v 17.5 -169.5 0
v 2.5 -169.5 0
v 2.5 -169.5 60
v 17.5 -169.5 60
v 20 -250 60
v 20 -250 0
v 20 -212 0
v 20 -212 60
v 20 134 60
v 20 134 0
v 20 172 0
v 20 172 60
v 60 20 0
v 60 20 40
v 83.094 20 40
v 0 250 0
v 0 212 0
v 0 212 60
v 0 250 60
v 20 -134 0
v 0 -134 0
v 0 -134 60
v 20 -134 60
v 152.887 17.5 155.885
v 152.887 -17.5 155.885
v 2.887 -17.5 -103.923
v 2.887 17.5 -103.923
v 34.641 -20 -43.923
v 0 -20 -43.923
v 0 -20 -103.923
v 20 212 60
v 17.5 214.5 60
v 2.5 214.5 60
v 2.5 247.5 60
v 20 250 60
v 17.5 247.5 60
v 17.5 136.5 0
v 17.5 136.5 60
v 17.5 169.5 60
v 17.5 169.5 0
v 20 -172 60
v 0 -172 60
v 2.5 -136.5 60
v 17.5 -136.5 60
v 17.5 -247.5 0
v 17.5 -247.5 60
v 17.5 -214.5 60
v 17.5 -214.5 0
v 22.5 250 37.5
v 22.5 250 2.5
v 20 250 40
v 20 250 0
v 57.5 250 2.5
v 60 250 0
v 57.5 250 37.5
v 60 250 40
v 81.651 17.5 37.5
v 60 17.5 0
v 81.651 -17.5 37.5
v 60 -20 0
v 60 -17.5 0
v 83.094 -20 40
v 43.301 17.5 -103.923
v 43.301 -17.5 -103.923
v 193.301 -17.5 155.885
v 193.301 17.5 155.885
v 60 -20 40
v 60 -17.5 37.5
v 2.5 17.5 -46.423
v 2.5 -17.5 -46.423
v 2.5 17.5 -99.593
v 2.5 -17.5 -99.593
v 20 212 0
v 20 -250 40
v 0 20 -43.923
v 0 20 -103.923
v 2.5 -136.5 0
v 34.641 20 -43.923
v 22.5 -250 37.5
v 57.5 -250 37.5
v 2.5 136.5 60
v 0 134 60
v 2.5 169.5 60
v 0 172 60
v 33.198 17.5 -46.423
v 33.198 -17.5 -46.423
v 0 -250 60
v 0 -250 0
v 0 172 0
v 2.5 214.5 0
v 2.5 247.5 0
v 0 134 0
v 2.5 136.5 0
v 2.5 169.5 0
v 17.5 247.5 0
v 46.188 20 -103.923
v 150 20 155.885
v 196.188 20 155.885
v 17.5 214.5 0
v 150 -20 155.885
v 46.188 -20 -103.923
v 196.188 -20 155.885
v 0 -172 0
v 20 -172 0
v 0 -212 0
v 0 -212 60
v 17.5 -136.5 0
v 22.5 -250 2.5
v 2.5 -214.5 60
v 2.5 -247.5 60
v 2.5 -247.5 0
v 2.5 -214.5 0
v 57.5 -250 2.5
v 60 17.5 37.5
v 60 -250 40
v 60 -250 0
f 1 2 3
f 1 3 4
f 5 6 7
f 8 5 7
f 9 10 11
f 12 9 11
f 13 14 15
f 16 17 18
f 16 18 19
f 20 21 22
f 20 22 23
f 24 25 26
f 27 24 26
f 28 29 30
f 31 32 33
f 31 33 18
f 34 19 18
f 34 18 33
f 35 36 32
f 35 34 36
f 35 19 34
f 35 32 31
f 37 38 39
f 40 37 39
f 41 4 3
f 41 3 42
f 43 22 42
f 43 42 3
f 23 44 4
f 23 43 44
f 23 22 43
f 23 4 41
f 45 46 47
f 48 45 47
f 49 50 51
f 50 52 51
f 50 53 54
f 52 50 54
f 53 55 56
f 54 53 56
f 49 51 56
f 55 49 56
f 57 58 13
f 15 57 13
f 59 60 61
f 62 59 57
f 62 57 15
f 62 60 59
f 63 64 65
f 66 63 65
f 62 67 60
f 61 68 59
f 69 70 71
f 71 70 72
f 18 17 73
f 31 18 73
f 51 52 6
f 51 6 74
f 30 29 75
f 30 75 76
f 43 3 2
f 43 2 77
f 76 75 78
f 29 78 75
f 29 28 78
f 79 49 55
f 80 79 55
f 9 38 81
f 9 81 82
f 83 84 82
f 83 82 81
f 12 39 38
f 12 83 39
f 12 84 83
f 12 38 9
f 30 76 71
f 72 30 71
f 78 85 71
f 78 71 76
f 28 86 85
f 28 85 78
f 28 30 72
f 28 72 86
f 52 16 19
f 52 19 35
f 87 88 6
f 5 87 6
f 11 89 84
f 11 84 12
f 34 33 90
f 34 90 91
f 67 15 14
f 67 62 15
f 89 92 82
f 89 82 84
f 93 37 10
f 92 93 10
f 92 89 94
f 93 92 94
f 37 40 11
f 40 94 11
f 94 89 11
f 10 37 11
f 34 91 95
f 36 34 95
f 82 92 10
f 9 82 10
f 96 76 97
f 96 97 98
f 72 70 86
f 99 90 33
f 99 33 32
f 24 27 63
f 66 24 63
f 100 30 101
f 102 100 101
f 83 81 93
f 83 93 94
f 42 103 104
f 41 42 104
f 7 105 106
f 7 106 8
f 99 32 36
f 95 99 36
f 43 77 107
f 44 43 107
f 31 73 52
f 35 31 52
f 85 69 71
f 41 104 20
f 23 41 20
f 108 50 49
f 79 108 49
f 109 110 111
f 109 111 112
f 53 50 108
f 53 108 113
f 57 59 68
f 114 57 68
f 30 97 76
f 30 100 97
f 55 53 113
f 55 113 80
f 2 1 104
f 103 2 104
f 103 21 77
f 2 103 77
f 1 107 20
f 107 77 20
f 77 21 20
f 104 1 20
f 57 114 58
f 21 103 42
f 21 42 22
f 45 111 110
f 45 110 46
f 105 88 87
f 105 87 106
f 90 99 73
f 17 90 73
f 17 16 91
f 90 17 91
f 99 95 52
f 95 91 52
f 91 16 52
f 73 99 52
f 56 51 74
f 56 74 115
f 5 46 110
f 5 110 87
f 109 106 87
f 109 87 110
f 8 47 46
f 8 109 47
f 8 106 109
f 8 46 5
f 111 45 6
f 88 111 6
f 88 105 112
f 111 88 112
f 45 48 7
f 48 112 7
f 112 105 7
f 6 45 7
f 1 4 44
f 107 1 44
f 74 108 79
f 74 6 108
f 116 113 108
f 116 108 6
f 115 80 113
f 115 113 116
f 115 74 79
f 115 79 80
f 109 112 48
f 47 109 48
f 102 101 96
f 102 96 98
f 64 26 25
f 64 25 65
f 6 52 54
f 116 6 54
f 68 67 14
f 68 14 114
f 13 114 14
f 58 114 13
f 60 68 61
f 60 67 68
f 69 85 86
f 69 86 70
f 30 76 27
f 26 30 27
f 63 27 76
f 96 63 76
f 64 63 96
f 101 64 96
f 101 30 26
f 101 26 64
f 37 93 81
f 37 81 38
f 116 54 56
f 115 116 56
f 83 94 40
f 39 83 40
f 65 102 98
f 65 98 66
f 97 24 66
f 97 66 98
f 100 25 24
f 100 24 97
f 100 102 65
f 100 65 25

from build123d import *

# Parameters (mm, degrees)
F0_W           = 20
F0_H           = 38
F1_DEPTH       = 60
F2_T           = -2.5
F2_2_T         = -2.5
F2_3_T         = -2.5
F2_4_T         = -2.5
F3_W           = 40
F3_H           = 40
F4_DEPTH       = 250
F4_DEPTH_BACK  = 250
F5_T           = -2.5
F7_DEPTH       = 20
F7_DEPTH_BACK  = 20
F8_T           = -2.5
F10_DEPTH      = 20
F10_DEPTH_BACK = 20
F11_T          = -2.5
F13_DEPTH      = 20
F13_DEPTH_BACK = 20
F14_T          = -2.5


with BuildPart() as f1:
    # F0 (on Top) → F1 (new body)
    with BuildSketch(Plane.XY):
        with Locations((10, 231)):
            Rectangle(F0_W, F0_H)
    extrude(amount=F1_DEPTH)

    # F2#4
    f2_4_openings = [f1.faces().sort_by_distance(p)[0] for p in [
        (10, 231, 60),
        (10, 231, 0),
    ]]
    offset(amount=F2_4_T, openings=f2_4_openings)


with BuildPart() as f1b:
    # F0 (on Top) → F1, piece 2 (new body)
    with BuildSketch(Plane.XY):
        with Locations((10, 153)):
            Rectangle(F0_W, F0_H)
    extrude(amount=F1_DEPTH)

    # F2#3
    f2_3_openings = [f1b.faces().sort_by_distance(p)[0] for p in [
        (10, 153, 60),
        (10, 153, 0),
    ]]
    offset(amount=F2_3_T, openings=f2_3_openings)


with BuildPart() as f1c:
    # F0 (on Top) → F1, piece 3 (new body)
    with BuildSketch(Plane.XY):
        with Locations((10, -231)):
            Rectangle(F0_W, F0_H)
    extrude(amount=F1_DEPTH)

    # F2
    f2_openings = [f1c.faces().sort_by_distance(p)[0] for p in [
        (10, -231, 60),
        (10, -231, 0),
    ]]
    offset(amount=F2_T, openings=f2_openings)


with BuildPart() as f1d:
    # F0 (on Top) → F1, piece 4 (new body)
    with BuildSketch(Plane.XY):
        with Locations((10, -153)):
            Rectangle(F0_W, F0_H)
    extrude(amount=F1_DEPTH)

    # F2#2
    f2_2_openings = [f1d.faces().sort_by_distance(p)[0] for p in [
        (10, -153, 60),
        (10, -153, 0),
    ]]
    offset(amount=F2_2_T, openings=f2_2_openings)


with BuildPart() as f4:
    # F3 (on Front) → F4 (new body, two sides)
    with BuildSketch(Plane.XZ) as f4_sk:
        with Locations((40, 20)):
            Rectangle(F3_W, F3_H)
    extrude(amount=F4_DEPTH)
    extrude(f4_sk.sketch, amount=-F4_DEPTH_BACK)

    # F5
    f5_openings = [f4.faces().sort_by_distance(p)[0] for p in [
        (40, -250, 20),
        (40, 250, 20),
    ]]
    offset(amount=F5_T, openings=f5_openings)


with BuildPart() as f7:
    # F6 (on Front) → F7 (new body, two sides)
    with BuildSketch(Plane.XZ) as f7_sk:
        Polygon((150, 155.8845726812), (0, -103.9230484541), (46.1880215352, -103.9230484541), (196.1880215352, 155.8845726812), align=None)
    extrude(amount=F7_DEPTH)
    extrude(f7_sk.sketch, amount=-F7_DEPTH_BACK)

    # F8
    f8_openings = [f7.faces().sort_by_distance(p)[0] for p in [
        (23.094011, 0, -103.923048),
        (173.094011, 0, 155.884573),
    ]]
    offset(amount=F8_T, openings=f8_openings)


with BuildPart() as f10:
    # F9 (on Front) → F10 (new body, two sides)
    with BuildSketch(Plane.XZ) as f10_sk:
        Polygon((34.6410161514, -43.9230484541), (0, -43.9230484541), (0, -103.9230484541), align=None)
    extrude(amount=F10_DEPTH)
    extrude(f10_sk.sketch, amount=-F10_DEPTH_BACK)

    # F11
    f11_openings = [f10.faces().sort_by_distance(p)[0] for p in [
        (17.320508, 0, -73.923048),
    ]]
    offset(amount=F11_T, openings=f11_openings)


with BuildPart() as f13:
    # F12 (on Front) → F13 (new body, two sides)
    with BuildSketch(Plane.XZ) as f13_sk:
        Polygon((83.0940107676, 40), (60, 40), (60, 0), align=None)
    extrude(amount=F13_DEPTH)
    extrude(f13_sk.sketch, amount=-F13_DEPTH_BACK)

    # F14
    f14_openings = [f13.faces().sort_by_distance(p)[0] for p in [
        (71.547005, 0, 20),
        (60, 0, 20),
    ]]
    offset(amount=F14_T, openings=f14_openings)


solid = Compound([f1.part, f1b.part, f1c.part, f1d.part, f4.part, f7.part, f10.part, f13.part])
